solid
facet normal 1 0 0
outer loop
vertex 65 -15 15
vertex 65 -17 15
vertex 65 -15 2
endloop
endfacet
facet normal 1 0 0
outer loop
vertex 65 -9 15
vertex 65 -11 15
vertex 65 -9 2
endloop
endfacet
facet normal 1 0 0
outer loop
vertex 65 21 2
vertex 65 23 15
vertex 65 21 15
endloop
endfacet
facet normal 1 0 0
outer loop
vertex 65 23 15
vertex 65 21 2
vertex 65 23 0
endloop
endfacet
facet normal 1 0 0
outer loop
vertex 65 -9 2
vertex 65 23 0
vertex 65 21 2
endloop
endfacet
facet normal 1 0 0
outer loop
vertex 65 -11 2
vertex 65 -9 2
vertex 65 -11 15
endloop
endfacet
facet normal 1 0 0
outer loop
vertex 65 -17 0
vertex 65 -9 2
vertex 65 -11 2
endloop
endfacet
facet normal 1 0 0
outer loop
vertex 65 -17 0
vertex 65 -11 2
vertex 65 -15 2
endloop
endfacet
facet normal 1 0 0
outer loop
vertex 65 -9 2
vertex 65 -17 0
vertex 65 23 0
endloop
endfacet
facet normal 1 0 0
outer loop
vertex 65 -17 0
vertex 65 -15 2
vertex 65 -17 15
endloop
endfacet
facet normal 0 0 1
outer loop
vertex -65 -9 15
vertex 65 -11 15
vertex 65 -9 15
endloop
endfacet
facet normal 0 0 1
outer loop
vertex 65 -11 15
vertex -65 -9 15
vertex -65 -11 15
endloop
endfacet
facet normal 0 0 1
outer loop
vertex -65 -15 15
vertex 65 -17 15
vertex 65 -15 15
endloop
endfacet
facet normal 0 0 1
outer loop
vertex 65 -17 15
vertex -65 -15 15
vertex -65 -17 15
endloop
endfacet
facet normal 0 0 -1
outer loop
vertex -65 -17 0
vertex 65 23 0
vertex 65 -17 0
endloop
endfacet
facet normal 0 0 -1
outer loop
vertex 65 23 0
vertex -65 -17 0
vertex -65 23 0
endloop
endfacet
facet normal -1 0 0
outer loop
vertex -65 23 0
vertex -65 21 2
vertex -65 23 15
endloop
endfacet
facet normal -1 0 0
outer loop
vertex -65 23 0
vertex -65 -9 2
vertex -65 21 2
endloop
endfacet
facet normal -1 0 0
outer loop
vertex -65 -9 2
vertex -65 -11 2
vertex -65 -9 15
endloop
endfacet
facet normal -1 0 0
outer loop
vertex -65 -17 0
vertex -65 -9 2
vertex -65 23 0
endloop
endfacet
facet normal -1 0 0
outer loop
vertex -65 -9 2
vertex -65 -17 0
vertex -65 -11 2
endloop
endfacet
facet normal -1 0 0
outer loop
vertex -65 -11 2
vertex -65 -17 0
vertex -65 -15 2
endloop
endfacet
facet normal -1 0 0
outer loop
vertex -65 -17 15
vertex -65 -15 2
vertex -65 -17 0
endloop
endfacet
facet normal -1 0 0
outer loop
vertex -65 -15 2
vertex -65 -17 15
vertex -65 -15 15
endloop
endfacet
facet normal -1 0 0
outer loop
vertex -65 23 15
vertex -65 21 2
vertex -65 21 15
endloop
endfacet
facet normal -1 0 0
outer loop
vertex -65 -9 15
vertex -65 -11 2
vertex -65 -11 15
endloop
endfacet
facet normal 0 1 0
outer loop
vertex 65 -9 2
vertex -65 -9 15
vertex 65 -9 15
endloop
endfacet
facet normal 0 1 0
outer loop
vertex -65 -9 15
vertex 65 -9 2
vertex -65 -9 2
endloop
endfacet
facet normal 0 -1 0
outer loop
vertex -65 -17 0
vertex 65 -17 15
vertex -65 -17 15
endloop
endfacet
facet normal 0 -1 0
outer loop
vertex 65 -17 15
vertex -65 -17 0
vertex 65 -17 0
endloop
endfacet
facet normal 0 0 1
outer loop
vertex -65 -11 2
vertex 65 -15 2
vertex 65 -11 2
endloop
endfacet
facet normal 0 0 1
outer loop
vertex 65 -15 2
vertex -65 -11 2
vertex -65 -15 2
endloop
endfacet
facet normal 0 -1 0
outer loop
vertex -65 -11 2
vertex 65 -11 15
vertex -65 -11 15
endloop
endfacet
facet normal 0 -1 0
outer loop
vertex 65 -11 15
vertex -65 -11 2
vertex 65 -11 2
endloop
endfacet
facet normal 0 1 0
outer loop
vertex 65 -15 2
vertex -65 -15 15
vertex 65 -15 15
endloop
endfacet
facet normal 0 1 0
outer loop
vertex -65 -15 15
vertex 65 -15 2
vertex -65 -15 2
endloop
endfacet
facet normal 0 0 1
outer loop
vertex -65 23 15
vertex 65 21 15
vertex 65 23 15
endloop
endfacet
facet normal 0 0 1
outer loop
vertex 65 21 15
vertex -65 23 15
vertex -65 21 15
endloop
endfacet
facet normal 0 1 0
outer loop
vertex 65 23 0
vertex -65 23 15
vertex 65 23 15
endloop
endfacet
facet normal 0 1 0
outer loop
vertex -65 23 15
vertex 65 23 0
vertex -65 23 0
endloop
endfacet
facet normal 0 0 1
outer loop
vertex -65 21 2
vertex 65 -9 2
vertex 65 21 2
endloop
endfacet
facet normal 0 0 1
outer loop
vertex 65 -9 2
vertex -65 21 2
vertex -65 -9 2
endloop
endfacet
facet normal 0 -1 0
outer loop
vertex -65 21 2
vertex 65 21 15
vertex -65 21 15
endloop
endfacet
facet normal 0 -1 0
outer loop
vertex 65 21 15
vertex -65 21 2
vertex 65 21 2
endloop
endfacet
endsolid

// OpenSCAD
wall_thickness = 2;
tray_height = 15;
tray_width = 30;
clip_height = 15;
clip_width = 4;
holder_length = 130;

module marker_holder() {
  translate([-holder_length / 2, -(clip_width + tray_width) / 2, 0]) {
		union() {
      	difference() {
        		cube([holder_length, clip_width + 2 * wall_thickness, clip_height]);
        			translate([0, wall_thickness, wall_thickness]) {
          			cube([holder_length, clip_width, clip_height]);
      			}
    		}
    		translate([0, clip_width + wall_thickness, 0]) {
      		difference() {
        			cube([holder_length, tray_width + 2 * wall_thickness, tray_height]);
        				translate([0, wall_thickness, wall_thickness]) {
          				cube([holder_length, tray_width, tray_height]);
						}
        		}
      	}
    	}
  	}
}

marker_holder();
